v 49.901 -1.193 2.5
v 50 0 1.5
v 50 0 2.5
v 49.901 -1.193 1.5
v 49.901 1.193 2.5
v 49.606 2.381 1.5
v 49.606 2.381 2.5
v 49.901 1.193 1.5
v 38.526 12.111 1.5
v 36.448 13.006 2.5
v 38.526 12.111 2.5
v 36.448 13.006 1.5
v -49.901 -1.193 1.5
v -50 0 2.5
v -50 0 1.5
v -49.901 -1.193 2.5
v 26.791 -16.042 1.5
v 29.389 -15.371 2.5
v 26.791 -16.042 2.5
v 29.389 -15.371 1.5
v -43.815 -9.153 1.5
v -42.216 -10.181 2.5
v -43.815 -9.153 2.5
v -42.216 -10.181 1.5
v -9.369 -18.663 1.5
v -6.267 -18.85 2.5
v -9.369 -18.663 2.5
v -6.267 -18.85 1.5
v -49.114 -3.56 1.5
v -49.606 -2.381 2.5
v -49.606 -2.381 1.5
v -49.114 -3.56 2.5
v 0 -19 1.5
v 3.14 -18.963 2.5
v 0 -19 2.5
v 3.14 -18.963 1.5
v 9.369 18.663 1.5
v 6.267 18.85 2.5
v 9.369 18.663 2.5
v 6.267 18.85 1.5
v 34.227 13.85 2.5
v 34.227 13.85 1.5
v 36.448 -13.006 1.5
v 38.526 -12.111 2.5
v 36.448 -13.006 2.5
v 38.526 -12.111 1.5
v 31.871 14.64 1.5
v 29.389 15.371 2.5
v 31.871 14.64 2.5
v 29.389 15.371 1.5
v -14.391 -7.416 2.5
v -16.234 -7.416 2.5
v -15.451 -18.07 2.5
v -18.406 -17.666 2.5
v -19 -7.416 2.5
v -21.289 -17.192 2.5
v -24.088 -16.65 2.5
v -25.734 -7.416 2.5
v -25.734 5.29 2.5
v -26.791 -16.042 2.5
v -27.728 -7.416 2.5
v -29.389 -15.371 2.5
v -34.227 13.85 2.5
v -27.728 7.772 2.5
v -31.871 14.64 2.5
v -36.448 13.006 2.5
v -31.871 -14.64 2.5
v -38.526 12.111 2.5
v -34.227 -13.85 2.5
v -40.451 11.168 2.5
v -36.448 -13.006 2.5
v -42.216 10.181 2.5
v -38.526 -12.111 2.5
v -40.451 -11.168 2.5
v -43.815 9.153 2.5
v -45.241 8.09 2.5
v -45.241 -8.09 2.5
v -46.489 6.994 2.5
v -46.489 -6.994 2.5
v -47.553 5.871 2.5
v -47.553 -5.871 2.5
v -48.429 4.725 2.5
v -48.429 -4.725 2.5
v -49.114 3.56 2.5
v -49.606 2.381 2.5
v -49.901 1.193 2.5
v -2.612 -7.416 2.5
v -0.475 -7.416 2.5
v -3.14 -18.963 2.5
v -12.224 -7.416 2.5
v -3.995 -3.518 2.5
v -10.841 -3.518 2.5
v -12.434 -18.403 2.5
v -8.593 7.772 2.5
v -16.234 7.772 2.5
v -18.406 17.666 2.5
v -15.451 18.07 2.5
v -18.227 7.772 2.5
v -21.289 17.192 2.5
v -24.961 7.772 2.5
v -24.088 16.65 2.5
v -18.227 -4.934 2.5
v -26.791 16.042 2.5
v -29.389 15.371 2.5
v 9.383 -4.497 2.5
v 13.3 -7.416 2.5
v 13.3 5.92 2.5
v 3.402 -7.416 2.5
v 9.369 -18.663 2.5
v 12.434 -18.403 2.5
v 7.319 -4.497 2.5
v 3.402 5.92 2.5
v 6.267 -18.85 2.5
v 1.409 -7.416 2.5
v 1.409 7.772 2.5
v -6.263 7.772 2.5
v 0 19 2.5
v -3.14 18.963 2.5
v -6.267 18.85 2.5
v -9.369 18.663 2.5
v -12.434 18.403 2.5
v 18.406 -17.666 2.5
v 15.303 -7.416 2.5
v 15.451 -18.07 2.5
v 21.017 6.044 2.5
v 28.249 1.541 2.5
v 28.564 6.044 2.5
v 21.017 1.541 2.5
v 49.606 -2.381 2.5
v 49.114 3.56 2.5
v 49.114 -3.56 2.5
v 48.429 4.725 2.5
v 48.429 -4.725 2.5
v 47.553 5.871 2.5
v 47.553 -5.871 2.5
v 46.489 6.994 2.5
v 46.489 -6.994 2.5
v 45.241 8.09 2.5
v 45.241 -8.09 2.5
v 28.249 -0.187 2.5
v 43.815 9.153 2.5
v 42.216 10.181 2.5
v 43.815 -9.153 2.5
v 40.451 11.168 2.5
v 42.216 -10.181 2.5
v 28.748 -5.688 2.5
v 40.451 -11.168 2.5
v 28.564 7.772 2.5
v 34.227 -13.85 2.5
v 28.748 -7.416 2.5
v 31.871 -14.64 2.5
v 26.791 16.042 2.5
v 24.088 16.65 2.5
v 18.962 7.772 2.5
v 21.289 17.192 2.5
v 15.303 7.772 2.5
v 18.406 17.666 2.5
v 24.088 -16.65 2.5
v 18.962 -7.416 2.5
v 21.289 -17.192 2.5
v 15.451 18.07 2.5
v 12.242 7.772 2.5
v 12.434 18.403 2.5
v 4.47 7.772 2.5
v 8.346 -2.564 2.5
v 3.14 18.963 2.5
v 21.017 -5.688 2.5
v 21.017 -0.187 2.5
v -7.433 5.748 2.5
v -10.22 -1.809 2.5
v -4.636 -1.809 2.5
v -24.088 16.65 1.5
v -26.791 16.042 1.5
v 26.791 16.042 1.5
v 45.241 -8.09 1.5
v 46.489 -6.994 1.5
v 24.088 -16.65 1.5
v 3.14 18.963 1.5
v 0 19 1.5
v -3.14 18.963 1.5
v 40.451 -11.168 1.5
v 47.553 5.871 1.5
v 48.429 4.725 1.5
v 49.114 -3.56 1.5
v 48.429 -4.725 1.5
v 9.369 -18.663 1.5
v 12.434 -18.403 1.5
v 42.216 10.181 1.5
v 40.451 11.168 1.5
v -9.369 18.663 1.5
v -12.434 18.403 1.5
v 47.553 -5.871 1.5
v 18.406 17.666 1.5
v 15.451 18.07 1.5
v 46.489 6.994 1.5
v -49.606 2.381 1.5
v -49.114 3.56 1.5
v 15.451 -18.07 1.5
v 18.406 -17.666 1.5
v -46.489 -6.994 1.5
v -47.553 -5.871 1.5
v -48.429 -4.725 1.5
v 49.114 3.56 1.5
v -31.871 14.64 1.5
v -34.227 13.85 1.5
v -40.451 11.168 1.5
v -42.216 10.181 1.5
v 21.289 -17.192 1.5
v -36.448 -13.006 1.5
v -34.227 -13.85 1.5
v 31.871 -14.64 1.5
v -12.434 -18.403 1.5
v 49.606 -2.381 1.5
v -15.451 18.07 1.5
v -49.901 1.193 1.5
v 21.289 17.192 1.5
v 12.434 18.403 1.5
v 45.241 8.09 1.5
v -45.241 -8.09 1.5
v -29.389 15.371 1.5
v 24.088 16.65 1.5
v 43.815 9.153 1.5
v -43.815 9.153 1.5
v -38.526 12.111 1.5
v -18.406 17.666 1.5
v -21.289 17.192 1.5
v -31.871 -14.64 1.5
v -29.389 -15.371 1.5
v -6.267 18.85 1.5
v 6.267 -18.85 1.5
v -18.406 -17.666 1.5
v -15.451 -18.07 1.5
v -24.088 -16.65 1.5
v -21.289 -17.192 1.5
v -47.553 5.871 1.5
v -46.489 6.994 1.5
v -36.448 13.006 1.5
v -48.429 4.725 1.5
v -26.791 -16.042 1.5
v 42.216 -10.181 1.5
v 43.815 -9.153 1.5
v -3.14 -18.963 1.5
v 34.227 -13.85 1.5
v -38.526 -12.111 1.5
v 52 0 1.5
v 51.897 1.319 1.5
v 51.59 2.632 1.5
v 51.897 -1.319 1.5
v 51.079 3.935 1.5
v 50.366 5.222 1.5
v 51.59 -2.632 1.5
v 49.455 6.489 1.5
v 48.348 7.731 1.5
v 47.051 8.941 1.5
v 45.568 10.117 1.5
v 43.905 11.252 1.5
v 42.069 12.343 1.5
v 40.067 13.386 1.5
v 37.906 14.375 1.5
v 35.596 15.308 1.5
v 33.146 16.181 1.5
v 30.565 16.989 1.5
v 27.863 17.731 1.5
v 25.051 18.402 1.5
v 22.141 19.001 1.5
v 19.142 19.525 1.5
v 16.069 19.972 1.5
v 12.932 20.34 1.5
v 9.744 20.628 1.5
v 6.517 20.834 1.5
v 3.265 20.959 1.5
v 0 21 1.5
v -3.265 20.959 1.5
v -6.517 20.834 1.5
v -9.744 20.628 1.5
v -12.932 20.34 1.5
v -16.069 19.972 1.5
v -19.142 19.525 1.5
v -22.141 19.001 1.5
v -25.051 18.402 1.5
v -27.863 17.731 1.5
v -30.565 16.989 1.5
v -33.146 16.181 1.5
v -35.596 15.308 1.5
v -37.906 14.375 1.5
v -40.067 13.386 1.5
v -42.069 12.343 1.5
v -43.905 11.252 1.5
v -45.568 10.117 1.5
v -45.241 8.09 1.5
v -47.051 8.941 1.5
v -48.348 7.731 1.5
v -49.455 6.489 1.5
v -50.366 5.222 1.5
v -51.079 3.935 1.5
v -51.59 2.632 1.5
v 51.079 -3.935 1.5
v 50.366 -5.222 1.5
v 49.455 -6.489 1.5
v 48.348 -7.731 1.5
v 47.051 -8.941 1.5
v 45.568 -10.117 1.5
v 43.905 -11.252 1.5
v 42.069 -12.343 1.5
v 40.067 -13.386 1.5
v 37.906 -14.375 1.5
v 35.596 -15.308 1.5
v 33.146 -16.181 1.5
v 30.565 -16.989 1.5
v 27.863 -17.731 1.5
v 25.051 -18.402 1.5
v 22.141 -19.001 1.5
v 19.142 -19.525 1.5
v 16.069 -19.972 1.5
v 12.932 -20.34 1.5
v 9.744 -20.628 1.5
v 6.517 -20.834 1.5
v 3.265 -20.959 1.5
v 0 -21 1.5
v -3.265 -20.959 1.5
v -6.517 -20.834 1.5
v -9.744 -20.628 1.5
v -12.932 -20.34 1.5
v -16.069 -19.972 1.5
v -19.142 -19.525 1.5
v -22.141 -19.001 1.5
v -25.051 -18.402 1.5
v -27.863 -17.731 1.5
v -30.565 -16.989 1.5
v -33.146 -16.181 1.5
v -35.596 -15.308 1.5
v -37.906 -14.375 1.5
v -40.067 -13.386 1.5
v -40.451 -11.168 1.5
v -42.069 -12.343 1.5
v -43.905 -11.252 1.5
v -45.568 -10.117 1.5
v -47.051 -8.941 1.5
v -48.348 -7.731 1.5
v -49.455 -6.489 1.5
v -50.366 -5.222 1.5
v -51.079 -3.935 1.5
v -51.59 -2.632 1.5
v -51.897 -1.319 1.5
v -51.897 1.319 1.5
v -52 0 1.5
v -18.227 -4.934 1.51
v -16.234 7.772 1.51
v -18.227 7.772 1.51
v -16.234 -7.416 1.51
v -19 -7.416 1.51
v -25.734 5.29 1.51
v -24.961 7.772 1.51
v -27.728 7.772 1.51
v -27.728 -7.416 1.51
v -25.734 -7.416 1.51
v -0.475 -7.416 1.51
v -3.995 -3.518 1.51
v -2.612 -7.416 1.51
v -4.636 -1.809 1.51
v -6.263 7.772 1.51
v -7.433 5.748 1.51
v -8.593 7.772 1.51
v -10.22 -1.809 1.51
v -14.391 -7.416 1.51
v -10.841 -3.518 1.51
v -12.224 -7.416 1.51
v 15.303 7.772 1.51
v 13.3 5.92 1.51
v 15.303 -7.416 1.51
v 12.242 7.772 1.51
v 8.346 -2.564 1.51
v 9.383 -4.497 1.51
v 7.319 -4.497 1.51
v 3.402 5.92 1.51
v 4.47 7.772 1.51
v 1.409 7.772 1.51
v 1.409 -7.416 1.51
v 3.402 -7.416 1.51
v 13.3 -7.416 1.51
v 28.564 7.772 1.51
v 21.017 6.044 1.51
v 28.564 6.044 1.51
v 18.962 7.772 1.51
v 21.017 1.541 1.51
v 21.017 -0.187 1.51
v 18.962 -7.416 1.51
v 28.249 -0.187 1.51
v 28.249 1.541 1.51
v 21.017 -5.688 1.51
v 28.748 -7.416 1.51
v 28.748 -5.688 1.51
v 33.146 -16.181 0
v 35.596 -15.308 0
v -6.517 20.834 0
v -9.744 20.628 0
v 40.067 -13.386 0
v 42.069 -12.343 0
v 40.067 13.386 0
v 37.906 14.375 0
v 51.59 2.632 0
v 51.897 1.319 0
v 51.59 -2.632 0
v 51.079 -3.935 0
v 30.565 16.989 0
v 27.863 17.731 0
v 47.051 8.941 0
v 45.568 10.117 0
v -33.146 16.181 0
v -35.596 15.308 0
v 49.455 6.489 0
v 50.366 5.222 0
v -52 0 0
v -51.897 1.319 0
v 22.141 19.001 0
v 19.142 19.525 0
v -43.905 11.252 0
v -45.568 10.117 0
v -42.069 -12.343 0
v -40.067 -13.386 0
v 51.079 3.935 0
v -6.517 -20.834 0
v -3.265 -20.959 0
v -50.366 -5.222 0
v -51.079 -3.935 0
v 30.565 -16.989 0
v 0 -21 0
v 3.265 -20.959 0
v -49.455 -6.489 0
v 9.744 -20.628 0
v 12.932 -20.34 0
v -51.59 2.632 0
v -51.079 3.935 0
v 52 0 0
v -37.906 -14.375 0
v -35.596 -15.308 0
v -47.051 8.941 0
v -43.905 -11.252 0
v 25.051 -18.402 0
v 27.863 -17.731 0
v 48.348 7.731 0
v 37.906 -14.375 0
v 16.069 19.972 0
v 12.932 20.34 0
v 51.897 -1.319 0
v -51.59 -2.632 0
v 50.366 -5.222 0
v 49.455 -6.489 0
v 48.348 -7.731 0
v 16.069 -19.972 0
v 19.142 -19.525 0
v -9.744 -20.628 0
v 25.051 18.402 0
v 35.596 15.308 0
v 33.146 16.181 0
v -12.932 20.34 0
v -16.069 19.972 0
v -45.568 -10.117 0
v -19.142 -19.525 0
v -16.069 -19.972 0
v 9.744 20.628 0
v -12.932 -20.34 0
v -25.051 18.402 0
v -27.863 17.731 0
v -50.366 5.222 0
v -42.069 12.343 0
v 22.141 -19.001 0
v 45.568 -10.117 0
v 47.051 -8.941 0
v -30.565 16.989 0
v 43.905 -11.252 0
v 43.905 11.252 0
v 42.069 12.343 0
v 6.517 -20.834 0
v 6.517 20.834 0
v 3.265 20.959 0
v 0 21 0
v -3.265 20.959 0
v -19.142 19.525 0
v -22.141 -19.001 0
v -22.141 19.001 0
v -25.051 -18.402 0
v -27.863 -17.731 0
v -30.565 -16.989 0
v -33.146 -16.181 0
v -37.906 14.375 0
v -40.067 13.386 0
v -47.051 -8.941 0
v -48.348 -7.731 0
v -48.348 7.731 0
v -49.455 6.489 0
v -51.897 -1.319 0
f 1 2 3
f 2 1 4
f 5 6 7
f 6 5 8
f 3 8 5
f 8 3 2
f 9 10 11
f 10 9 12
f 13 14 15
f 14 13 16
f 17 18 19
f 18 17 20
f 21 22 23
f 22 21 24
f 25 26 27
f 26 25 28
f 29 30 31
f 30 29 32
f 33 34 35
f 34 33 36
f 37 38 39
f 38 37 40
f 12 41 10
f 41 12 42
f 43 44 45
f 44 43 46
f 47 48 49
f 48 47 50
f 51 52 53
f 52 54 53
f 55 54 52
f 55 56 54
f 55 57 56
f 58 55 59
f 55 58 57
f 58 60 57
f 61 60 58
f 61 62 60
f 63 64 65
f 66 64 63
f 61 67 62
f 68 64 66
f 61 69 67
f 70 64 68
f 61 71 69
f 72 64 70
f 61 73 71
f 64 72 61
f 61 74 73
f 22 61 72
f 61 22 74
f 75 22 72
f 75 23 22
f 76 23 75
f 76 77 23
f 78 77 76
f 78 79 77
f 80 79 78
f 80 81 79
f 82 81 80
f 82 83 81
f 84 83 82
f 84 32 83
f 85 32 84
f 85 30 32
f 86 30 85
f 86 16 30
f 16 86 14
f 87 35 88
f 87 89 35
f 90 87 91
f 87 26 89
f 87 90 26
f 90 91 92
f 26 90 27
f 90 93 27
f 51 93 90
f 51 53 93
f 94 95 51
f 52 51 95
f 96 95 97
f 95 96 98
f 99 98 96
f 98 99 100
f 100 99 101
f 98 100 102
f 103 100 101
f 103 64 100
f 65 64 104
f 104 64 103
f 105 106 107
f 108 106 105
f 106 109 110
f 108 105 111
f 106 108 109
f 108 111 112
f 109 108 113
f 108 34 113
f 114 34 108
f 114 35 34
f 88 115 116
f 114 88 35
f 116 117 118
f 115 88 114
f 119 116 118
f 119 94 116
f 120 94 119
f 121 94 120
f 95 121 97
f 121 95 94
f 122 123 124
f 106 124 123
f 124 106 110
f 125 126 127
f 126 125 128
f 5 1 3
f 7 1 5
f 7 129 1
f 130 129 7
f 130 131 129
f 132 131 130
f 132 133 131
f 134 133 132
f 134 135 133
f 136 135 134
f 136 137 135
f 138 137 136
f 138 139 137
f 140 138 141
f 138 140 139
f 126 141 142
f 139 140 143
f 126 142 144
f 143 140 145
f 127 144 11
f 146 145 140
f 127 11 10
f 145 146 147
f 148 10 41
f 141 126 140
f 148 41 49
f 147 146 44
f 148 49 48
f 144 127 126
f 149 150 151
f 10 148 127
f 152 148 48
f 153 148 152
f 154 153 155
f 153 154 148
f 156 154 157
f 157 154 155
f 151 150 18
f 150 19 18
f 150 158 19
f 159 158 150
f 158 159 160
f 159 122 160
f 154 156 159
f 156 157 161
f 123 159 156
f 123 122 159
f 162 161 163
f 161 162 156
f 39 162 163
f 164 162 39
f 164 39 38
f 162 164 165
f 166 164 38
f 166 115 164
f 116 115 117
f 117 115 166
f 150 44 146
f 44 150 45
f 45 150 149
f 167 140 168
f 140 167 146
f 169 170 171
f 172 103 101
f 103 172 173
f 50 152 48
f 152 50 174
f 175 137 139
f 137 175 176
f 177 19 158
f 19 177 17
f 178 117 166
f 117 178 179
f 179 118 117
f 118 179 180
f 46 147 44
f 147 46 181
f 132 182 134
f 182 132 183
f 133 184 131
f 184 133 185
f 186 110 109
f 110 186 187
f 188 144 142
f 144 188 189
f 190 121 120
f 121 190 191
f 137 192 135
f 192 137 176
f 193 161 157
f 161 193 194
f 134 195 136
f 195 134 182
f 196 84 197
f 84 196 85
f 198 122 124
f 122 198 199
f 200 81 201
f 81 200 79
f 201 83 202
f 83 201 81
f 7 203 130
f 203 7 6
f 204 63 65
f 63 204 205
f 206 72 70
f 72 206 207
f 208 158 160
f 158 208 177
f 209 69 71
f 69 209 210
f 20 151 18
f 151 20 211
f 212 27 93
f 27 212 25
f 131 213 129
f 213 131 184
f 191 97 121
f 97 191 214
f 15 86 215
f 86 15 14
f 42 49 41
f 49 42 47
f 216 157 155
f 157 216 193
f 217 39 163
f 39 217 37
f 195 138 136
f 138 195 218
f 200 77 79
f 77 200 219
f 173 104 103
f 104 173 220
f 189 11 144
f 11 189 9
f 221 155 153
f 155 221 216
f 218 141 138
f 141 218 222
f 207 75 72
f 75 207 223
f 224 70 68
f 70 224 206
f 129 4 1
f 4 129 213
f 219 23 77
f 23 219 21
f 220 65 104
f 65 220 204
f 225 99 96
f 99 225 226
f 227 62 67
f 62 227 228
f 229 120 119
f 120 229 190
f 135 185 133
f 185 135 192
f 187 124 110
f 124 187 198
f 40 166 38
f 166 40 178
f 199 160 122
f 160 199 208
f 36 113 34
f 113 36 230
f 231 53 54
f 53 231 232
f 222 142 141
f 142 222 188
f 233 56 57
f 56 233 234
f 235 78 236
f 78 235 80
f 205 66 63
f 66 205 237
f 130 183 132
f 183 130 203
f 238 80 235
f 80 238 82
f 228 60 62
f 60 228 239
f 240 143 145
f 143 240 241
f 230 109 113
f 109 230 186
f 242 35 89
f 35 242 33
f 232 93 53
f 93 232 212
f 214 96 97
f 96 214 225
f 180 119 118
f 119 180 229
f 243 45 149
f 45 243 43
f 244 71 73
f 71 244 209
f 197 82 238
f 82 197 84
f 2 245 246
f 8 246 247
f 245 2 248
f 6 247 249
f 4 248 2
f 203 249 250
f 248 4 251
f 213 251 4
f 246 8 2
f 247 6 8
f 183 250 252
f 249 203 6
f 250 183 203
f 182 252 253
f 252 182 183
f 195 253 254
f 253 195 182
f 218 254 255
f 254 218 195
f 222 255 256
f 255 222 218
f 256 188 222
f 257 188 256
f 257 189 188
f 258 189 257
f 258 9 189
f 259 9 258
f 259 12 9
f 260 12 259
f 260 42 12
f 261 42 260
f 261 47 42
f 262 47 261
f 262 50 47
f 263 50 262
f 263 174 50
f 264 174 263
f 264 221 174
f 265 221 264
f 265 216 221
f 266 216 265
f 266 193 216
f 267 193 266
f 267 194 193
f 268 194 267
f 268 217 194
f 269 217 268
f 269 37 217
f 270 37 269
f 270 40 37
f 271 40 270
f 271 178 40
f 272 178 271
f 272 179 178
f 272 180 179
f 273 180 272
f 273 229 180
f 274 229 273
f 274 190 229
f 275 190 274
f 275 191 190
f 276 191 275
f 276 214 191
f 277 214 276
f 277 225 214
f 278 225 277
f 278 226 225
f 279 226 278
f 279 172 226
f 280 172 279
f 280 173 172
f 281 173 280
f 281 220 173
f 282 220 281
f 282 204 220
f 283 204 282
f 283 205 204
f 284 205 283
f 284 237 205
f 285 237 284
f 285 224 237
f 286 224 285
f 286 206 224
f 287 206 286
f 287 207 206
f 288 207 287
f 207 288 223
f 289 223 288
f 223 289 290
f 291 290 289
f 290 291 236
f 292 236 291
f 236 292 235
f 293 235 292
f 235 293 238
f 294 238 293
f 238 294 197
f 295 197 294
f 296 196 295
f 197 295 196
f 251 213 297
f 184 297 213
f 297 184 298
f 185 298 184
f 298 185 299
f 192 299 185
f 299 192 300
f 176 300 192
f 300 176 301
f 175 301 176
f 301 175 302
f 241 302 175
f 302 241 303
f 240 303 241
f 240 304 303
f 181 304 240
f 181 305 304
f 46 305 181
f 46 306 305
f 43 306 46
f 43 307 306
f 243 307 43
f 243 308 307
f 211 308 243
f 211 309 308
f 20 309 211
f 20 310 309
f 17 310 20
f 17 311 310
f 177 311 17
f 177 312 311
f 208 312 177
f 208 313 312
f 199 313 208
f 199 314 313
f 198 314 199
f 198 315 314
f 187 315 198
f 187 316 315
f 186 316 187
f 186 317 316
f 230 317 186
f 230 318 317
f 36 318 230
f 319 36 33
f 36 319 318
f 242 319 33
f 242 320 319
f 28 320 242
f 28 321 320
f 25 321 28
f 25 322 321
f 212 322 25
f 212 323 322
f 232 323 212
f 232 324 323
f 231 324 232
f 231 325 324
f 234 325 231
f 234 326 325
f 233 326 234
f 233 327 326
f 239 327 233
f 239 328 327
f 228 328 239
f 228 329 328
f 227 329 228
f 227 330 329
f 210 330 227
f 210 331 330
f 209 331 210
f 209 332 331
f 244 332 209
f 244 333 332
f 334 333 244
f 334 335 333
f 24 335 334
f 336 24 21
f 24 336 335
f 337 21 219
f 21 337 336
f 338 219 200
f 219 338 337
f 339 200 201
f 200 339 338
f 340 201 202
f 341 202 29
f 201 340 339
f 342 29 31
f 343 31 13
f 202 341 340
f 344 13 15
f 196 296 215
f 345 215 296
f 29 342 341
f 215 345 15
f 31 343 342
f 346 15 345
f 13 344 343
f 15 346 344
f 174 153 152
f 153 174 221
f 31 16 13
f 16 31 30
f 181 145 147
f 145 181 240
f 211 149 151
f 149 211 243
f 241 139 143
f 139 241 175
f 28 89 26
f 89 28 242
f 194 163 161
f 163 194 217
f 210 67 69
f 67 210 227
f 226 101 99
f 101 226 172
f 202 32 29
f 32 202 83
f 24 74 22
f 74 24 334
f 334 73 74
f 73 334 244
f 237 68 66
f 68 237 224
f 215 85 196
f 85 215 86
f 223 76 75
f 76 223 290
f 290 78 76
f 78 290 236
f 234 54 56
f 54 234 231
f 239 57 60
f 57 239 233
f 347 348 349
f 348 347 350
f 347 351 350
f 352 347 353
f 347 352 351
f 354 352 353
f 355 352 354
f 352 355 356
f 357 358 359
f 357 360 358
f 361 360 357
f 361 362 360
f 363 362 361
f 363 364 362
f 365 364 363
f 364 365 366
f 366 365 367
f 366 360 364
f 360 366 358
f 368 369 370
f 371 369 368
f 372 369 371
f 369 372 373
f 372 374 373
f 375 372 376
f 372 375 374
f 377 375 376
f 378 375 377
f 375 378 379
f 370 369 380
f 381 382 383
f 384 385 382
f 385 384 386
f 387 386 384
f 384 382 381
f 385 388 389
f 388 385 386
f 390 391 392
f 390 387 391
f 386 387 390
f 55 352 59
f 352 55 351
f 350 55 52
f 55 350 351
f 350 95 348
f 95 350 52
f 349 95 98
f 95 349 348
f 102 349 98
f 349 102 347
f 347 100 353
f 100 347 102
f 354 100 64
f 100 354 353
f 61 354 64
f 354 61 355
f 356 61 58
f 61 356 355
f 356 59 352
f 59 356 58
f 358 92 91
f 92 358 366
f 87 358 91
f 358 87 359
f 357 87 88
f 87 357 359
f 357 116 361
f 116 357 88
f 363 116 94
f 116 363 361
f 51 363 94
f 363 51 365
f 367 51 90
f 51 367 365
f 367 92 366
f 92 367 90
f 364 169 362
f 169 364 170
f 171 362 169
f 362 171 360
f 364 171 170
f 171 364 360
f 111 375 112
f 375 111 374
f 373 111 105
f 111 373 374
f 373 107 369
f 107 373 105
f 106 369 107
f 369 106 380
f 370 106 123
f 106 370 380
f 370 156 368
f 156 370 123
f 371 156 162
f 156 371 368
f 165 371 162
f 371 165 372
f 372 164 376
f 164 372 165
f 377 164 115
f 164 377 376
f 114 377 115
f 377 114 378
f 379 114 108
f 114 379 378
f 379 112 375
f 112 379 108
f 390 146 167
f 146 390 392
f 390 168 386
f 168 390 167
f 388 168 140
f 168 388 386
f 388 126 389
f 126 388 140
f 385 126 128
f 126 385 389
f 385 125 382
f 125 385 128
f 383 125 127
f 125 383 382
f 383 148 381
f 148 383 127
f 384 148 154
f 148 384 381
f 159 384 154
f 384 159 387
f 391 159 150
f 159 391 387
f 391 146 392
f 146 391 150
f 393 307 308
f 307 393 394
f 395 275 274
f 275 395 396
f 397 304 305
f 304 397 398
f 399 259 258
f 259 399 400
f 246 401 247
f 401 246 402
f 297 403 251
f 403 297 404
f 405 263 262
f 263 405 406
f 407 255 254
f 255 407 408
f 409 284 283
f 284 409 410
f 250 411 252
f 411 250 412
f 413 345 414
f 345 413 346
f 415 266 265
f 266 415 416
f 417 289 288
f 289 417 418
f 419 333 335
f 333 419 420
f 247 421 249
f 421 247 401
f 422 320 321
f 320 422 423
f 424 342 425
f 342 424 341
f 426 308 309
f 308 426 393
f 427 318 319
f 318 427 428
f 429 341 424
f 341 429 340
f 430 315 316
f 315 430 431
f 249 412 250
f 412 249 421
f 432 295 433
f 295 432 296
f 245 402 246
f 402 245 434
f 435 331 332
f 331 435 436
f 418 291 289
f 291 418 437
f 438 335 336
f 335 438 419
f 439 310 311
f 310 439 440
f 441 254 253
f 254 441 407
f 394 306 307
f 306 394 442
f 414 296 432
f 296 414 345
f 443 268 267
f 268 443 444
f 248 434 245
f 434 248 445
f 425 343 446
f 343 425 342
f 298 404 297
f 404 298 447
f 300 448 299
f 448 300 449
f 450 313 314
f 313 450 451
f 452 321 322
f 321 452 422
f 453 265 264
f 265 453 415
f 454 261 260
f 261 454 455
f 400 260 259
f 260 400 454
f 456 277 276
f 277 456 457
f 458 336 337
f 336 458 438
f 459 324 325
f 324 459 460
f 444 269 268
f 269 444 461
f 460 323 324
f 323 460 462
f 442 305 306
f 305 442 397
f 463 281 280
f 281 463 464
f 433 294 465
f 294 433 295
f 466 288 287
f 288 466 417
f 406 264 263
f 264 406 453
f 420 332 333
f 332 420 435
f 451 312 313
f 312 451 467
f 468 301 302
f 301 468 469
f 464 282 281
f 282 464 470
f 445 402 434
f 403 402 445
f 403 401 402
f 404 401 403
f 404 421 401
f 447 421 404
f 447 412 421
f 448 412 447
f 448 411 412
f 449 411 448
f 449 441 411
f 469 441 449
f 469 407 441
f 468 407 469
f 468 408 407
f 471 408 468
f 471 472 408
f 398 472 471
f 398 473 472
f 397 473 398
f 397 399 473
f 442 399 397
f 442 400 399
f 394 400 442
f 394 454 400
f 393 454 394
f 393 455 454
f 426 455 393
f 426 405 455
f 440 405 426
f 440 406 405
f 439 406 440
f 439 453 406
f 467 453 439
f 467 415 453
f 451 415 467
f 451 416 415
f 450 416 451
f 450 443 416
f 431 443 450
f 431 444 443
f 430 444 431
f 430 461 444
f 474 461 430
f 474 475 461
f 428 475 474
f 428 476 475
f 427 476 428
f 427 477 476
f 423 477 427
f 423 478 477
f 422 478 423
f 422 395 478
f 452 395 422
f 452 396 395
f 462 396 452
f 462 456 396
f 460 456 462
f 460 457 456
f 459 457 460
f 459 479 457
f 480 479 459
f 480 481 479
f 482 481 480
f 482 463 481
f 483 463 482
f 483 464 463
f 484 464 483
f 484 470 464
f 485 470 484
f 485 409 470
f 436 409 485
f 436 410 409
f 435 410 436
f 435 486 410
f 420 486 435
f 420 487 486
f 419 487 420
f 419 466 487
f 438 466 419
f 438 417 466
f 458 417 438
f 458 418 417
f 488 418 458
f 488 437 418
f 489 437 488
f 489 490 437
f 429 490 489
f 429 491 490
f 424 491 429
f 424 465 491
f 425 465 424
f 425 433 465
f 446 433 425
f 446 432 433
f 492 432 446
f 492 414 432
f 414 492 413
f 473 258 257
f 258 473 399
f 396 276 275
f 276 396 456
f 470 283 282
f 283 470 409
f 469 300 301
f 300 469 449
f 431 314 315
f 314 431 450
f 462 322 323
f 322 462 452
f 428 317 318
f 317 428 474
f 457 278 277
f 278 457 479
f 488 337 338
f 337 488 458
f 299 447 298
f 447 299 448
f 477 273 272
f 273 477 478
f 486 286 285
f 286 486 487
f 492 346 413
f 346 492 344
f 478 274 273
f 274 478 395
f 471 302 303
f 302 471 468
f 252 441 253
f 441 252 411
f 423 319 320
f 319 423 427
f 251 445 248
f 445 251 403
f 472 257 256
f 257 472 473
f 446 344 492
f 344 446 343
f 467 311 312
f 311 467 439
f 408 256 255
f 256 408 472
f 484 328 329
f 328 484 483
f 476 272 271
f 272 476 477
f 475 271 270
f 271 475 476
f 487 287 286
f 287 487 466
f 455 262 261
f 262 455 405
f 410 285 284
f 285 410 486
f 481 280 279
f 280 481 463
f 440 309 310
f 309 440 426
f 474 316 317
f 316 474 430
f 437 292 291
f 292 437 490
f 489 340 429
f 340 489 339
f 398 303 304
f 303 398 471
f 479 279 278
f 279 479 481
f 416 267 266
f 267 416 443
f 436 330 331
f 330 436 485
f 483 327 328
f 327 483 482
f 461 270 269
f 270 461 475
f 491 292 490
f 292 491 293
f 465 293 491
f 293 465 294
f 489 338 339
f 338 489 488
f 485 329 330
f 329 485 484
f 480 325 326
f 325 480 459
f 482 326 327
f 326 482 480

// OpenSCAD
// Two-Layer Oval Nameplate Template with Engraved Text
// Creates a white base oval with a blue top oval and engraved text

// Parameters - these can be overridden from command line
name = "NAME"; // Text to display on nameplate
oval_width = 100; // Width of the oval (mm) - max 100mm
oval_height = 38; // Height of the oval (mm) - proportional to width
base_thickness = 1.5; // Thickness of white base layer (mm)
top_thickness = 1; // Thickness of blue top layer (mm)
base_offset = 2; // How much larger the white base is (mm)
text_size = 15; // Font size for the text
text_depth = 1; // How deep the text is engraved (mm) - cuts through blue to show white
font_file = "C:/Users/Fred/claude/Fordscript.ttf"; // Path to the custom font file

// Module to create an oval (ellipse)
module oval(width, height, depth) {
    scale([width/2, height/2, 1])
        cylinder(h=depth, r=1, $fn=100);
}

// White base layer (larger oval)
module base_layer() {
    color("white")
    oval(
        oval_width + base_offset*2,
        oval_height + base_offset*2,
        base_thickness
    );
}

// Blue top layer with engraved text
module top_layer() {
    color("RoyalBlue")
    difference() {
        // Blue oval
        translate([0, 0, base_thickness])
            oval(oval_width, oval_height, top_thickness);

        // Engraved text (cuts into the blue layer)
        translate([0, 0, base_thickness + top_thickness - text_depth + 0.01])
            linear_extrude(height=text_depth)
                text(name,
                     size=text_size,
                     font="Fordscript",
                     halign="center",
                     valign="center");
    }
}

// Main nameplate assembly
module nameplate() {
    base_layer();
    top_layer();
}

// Generate the nameplate
nameplate();
